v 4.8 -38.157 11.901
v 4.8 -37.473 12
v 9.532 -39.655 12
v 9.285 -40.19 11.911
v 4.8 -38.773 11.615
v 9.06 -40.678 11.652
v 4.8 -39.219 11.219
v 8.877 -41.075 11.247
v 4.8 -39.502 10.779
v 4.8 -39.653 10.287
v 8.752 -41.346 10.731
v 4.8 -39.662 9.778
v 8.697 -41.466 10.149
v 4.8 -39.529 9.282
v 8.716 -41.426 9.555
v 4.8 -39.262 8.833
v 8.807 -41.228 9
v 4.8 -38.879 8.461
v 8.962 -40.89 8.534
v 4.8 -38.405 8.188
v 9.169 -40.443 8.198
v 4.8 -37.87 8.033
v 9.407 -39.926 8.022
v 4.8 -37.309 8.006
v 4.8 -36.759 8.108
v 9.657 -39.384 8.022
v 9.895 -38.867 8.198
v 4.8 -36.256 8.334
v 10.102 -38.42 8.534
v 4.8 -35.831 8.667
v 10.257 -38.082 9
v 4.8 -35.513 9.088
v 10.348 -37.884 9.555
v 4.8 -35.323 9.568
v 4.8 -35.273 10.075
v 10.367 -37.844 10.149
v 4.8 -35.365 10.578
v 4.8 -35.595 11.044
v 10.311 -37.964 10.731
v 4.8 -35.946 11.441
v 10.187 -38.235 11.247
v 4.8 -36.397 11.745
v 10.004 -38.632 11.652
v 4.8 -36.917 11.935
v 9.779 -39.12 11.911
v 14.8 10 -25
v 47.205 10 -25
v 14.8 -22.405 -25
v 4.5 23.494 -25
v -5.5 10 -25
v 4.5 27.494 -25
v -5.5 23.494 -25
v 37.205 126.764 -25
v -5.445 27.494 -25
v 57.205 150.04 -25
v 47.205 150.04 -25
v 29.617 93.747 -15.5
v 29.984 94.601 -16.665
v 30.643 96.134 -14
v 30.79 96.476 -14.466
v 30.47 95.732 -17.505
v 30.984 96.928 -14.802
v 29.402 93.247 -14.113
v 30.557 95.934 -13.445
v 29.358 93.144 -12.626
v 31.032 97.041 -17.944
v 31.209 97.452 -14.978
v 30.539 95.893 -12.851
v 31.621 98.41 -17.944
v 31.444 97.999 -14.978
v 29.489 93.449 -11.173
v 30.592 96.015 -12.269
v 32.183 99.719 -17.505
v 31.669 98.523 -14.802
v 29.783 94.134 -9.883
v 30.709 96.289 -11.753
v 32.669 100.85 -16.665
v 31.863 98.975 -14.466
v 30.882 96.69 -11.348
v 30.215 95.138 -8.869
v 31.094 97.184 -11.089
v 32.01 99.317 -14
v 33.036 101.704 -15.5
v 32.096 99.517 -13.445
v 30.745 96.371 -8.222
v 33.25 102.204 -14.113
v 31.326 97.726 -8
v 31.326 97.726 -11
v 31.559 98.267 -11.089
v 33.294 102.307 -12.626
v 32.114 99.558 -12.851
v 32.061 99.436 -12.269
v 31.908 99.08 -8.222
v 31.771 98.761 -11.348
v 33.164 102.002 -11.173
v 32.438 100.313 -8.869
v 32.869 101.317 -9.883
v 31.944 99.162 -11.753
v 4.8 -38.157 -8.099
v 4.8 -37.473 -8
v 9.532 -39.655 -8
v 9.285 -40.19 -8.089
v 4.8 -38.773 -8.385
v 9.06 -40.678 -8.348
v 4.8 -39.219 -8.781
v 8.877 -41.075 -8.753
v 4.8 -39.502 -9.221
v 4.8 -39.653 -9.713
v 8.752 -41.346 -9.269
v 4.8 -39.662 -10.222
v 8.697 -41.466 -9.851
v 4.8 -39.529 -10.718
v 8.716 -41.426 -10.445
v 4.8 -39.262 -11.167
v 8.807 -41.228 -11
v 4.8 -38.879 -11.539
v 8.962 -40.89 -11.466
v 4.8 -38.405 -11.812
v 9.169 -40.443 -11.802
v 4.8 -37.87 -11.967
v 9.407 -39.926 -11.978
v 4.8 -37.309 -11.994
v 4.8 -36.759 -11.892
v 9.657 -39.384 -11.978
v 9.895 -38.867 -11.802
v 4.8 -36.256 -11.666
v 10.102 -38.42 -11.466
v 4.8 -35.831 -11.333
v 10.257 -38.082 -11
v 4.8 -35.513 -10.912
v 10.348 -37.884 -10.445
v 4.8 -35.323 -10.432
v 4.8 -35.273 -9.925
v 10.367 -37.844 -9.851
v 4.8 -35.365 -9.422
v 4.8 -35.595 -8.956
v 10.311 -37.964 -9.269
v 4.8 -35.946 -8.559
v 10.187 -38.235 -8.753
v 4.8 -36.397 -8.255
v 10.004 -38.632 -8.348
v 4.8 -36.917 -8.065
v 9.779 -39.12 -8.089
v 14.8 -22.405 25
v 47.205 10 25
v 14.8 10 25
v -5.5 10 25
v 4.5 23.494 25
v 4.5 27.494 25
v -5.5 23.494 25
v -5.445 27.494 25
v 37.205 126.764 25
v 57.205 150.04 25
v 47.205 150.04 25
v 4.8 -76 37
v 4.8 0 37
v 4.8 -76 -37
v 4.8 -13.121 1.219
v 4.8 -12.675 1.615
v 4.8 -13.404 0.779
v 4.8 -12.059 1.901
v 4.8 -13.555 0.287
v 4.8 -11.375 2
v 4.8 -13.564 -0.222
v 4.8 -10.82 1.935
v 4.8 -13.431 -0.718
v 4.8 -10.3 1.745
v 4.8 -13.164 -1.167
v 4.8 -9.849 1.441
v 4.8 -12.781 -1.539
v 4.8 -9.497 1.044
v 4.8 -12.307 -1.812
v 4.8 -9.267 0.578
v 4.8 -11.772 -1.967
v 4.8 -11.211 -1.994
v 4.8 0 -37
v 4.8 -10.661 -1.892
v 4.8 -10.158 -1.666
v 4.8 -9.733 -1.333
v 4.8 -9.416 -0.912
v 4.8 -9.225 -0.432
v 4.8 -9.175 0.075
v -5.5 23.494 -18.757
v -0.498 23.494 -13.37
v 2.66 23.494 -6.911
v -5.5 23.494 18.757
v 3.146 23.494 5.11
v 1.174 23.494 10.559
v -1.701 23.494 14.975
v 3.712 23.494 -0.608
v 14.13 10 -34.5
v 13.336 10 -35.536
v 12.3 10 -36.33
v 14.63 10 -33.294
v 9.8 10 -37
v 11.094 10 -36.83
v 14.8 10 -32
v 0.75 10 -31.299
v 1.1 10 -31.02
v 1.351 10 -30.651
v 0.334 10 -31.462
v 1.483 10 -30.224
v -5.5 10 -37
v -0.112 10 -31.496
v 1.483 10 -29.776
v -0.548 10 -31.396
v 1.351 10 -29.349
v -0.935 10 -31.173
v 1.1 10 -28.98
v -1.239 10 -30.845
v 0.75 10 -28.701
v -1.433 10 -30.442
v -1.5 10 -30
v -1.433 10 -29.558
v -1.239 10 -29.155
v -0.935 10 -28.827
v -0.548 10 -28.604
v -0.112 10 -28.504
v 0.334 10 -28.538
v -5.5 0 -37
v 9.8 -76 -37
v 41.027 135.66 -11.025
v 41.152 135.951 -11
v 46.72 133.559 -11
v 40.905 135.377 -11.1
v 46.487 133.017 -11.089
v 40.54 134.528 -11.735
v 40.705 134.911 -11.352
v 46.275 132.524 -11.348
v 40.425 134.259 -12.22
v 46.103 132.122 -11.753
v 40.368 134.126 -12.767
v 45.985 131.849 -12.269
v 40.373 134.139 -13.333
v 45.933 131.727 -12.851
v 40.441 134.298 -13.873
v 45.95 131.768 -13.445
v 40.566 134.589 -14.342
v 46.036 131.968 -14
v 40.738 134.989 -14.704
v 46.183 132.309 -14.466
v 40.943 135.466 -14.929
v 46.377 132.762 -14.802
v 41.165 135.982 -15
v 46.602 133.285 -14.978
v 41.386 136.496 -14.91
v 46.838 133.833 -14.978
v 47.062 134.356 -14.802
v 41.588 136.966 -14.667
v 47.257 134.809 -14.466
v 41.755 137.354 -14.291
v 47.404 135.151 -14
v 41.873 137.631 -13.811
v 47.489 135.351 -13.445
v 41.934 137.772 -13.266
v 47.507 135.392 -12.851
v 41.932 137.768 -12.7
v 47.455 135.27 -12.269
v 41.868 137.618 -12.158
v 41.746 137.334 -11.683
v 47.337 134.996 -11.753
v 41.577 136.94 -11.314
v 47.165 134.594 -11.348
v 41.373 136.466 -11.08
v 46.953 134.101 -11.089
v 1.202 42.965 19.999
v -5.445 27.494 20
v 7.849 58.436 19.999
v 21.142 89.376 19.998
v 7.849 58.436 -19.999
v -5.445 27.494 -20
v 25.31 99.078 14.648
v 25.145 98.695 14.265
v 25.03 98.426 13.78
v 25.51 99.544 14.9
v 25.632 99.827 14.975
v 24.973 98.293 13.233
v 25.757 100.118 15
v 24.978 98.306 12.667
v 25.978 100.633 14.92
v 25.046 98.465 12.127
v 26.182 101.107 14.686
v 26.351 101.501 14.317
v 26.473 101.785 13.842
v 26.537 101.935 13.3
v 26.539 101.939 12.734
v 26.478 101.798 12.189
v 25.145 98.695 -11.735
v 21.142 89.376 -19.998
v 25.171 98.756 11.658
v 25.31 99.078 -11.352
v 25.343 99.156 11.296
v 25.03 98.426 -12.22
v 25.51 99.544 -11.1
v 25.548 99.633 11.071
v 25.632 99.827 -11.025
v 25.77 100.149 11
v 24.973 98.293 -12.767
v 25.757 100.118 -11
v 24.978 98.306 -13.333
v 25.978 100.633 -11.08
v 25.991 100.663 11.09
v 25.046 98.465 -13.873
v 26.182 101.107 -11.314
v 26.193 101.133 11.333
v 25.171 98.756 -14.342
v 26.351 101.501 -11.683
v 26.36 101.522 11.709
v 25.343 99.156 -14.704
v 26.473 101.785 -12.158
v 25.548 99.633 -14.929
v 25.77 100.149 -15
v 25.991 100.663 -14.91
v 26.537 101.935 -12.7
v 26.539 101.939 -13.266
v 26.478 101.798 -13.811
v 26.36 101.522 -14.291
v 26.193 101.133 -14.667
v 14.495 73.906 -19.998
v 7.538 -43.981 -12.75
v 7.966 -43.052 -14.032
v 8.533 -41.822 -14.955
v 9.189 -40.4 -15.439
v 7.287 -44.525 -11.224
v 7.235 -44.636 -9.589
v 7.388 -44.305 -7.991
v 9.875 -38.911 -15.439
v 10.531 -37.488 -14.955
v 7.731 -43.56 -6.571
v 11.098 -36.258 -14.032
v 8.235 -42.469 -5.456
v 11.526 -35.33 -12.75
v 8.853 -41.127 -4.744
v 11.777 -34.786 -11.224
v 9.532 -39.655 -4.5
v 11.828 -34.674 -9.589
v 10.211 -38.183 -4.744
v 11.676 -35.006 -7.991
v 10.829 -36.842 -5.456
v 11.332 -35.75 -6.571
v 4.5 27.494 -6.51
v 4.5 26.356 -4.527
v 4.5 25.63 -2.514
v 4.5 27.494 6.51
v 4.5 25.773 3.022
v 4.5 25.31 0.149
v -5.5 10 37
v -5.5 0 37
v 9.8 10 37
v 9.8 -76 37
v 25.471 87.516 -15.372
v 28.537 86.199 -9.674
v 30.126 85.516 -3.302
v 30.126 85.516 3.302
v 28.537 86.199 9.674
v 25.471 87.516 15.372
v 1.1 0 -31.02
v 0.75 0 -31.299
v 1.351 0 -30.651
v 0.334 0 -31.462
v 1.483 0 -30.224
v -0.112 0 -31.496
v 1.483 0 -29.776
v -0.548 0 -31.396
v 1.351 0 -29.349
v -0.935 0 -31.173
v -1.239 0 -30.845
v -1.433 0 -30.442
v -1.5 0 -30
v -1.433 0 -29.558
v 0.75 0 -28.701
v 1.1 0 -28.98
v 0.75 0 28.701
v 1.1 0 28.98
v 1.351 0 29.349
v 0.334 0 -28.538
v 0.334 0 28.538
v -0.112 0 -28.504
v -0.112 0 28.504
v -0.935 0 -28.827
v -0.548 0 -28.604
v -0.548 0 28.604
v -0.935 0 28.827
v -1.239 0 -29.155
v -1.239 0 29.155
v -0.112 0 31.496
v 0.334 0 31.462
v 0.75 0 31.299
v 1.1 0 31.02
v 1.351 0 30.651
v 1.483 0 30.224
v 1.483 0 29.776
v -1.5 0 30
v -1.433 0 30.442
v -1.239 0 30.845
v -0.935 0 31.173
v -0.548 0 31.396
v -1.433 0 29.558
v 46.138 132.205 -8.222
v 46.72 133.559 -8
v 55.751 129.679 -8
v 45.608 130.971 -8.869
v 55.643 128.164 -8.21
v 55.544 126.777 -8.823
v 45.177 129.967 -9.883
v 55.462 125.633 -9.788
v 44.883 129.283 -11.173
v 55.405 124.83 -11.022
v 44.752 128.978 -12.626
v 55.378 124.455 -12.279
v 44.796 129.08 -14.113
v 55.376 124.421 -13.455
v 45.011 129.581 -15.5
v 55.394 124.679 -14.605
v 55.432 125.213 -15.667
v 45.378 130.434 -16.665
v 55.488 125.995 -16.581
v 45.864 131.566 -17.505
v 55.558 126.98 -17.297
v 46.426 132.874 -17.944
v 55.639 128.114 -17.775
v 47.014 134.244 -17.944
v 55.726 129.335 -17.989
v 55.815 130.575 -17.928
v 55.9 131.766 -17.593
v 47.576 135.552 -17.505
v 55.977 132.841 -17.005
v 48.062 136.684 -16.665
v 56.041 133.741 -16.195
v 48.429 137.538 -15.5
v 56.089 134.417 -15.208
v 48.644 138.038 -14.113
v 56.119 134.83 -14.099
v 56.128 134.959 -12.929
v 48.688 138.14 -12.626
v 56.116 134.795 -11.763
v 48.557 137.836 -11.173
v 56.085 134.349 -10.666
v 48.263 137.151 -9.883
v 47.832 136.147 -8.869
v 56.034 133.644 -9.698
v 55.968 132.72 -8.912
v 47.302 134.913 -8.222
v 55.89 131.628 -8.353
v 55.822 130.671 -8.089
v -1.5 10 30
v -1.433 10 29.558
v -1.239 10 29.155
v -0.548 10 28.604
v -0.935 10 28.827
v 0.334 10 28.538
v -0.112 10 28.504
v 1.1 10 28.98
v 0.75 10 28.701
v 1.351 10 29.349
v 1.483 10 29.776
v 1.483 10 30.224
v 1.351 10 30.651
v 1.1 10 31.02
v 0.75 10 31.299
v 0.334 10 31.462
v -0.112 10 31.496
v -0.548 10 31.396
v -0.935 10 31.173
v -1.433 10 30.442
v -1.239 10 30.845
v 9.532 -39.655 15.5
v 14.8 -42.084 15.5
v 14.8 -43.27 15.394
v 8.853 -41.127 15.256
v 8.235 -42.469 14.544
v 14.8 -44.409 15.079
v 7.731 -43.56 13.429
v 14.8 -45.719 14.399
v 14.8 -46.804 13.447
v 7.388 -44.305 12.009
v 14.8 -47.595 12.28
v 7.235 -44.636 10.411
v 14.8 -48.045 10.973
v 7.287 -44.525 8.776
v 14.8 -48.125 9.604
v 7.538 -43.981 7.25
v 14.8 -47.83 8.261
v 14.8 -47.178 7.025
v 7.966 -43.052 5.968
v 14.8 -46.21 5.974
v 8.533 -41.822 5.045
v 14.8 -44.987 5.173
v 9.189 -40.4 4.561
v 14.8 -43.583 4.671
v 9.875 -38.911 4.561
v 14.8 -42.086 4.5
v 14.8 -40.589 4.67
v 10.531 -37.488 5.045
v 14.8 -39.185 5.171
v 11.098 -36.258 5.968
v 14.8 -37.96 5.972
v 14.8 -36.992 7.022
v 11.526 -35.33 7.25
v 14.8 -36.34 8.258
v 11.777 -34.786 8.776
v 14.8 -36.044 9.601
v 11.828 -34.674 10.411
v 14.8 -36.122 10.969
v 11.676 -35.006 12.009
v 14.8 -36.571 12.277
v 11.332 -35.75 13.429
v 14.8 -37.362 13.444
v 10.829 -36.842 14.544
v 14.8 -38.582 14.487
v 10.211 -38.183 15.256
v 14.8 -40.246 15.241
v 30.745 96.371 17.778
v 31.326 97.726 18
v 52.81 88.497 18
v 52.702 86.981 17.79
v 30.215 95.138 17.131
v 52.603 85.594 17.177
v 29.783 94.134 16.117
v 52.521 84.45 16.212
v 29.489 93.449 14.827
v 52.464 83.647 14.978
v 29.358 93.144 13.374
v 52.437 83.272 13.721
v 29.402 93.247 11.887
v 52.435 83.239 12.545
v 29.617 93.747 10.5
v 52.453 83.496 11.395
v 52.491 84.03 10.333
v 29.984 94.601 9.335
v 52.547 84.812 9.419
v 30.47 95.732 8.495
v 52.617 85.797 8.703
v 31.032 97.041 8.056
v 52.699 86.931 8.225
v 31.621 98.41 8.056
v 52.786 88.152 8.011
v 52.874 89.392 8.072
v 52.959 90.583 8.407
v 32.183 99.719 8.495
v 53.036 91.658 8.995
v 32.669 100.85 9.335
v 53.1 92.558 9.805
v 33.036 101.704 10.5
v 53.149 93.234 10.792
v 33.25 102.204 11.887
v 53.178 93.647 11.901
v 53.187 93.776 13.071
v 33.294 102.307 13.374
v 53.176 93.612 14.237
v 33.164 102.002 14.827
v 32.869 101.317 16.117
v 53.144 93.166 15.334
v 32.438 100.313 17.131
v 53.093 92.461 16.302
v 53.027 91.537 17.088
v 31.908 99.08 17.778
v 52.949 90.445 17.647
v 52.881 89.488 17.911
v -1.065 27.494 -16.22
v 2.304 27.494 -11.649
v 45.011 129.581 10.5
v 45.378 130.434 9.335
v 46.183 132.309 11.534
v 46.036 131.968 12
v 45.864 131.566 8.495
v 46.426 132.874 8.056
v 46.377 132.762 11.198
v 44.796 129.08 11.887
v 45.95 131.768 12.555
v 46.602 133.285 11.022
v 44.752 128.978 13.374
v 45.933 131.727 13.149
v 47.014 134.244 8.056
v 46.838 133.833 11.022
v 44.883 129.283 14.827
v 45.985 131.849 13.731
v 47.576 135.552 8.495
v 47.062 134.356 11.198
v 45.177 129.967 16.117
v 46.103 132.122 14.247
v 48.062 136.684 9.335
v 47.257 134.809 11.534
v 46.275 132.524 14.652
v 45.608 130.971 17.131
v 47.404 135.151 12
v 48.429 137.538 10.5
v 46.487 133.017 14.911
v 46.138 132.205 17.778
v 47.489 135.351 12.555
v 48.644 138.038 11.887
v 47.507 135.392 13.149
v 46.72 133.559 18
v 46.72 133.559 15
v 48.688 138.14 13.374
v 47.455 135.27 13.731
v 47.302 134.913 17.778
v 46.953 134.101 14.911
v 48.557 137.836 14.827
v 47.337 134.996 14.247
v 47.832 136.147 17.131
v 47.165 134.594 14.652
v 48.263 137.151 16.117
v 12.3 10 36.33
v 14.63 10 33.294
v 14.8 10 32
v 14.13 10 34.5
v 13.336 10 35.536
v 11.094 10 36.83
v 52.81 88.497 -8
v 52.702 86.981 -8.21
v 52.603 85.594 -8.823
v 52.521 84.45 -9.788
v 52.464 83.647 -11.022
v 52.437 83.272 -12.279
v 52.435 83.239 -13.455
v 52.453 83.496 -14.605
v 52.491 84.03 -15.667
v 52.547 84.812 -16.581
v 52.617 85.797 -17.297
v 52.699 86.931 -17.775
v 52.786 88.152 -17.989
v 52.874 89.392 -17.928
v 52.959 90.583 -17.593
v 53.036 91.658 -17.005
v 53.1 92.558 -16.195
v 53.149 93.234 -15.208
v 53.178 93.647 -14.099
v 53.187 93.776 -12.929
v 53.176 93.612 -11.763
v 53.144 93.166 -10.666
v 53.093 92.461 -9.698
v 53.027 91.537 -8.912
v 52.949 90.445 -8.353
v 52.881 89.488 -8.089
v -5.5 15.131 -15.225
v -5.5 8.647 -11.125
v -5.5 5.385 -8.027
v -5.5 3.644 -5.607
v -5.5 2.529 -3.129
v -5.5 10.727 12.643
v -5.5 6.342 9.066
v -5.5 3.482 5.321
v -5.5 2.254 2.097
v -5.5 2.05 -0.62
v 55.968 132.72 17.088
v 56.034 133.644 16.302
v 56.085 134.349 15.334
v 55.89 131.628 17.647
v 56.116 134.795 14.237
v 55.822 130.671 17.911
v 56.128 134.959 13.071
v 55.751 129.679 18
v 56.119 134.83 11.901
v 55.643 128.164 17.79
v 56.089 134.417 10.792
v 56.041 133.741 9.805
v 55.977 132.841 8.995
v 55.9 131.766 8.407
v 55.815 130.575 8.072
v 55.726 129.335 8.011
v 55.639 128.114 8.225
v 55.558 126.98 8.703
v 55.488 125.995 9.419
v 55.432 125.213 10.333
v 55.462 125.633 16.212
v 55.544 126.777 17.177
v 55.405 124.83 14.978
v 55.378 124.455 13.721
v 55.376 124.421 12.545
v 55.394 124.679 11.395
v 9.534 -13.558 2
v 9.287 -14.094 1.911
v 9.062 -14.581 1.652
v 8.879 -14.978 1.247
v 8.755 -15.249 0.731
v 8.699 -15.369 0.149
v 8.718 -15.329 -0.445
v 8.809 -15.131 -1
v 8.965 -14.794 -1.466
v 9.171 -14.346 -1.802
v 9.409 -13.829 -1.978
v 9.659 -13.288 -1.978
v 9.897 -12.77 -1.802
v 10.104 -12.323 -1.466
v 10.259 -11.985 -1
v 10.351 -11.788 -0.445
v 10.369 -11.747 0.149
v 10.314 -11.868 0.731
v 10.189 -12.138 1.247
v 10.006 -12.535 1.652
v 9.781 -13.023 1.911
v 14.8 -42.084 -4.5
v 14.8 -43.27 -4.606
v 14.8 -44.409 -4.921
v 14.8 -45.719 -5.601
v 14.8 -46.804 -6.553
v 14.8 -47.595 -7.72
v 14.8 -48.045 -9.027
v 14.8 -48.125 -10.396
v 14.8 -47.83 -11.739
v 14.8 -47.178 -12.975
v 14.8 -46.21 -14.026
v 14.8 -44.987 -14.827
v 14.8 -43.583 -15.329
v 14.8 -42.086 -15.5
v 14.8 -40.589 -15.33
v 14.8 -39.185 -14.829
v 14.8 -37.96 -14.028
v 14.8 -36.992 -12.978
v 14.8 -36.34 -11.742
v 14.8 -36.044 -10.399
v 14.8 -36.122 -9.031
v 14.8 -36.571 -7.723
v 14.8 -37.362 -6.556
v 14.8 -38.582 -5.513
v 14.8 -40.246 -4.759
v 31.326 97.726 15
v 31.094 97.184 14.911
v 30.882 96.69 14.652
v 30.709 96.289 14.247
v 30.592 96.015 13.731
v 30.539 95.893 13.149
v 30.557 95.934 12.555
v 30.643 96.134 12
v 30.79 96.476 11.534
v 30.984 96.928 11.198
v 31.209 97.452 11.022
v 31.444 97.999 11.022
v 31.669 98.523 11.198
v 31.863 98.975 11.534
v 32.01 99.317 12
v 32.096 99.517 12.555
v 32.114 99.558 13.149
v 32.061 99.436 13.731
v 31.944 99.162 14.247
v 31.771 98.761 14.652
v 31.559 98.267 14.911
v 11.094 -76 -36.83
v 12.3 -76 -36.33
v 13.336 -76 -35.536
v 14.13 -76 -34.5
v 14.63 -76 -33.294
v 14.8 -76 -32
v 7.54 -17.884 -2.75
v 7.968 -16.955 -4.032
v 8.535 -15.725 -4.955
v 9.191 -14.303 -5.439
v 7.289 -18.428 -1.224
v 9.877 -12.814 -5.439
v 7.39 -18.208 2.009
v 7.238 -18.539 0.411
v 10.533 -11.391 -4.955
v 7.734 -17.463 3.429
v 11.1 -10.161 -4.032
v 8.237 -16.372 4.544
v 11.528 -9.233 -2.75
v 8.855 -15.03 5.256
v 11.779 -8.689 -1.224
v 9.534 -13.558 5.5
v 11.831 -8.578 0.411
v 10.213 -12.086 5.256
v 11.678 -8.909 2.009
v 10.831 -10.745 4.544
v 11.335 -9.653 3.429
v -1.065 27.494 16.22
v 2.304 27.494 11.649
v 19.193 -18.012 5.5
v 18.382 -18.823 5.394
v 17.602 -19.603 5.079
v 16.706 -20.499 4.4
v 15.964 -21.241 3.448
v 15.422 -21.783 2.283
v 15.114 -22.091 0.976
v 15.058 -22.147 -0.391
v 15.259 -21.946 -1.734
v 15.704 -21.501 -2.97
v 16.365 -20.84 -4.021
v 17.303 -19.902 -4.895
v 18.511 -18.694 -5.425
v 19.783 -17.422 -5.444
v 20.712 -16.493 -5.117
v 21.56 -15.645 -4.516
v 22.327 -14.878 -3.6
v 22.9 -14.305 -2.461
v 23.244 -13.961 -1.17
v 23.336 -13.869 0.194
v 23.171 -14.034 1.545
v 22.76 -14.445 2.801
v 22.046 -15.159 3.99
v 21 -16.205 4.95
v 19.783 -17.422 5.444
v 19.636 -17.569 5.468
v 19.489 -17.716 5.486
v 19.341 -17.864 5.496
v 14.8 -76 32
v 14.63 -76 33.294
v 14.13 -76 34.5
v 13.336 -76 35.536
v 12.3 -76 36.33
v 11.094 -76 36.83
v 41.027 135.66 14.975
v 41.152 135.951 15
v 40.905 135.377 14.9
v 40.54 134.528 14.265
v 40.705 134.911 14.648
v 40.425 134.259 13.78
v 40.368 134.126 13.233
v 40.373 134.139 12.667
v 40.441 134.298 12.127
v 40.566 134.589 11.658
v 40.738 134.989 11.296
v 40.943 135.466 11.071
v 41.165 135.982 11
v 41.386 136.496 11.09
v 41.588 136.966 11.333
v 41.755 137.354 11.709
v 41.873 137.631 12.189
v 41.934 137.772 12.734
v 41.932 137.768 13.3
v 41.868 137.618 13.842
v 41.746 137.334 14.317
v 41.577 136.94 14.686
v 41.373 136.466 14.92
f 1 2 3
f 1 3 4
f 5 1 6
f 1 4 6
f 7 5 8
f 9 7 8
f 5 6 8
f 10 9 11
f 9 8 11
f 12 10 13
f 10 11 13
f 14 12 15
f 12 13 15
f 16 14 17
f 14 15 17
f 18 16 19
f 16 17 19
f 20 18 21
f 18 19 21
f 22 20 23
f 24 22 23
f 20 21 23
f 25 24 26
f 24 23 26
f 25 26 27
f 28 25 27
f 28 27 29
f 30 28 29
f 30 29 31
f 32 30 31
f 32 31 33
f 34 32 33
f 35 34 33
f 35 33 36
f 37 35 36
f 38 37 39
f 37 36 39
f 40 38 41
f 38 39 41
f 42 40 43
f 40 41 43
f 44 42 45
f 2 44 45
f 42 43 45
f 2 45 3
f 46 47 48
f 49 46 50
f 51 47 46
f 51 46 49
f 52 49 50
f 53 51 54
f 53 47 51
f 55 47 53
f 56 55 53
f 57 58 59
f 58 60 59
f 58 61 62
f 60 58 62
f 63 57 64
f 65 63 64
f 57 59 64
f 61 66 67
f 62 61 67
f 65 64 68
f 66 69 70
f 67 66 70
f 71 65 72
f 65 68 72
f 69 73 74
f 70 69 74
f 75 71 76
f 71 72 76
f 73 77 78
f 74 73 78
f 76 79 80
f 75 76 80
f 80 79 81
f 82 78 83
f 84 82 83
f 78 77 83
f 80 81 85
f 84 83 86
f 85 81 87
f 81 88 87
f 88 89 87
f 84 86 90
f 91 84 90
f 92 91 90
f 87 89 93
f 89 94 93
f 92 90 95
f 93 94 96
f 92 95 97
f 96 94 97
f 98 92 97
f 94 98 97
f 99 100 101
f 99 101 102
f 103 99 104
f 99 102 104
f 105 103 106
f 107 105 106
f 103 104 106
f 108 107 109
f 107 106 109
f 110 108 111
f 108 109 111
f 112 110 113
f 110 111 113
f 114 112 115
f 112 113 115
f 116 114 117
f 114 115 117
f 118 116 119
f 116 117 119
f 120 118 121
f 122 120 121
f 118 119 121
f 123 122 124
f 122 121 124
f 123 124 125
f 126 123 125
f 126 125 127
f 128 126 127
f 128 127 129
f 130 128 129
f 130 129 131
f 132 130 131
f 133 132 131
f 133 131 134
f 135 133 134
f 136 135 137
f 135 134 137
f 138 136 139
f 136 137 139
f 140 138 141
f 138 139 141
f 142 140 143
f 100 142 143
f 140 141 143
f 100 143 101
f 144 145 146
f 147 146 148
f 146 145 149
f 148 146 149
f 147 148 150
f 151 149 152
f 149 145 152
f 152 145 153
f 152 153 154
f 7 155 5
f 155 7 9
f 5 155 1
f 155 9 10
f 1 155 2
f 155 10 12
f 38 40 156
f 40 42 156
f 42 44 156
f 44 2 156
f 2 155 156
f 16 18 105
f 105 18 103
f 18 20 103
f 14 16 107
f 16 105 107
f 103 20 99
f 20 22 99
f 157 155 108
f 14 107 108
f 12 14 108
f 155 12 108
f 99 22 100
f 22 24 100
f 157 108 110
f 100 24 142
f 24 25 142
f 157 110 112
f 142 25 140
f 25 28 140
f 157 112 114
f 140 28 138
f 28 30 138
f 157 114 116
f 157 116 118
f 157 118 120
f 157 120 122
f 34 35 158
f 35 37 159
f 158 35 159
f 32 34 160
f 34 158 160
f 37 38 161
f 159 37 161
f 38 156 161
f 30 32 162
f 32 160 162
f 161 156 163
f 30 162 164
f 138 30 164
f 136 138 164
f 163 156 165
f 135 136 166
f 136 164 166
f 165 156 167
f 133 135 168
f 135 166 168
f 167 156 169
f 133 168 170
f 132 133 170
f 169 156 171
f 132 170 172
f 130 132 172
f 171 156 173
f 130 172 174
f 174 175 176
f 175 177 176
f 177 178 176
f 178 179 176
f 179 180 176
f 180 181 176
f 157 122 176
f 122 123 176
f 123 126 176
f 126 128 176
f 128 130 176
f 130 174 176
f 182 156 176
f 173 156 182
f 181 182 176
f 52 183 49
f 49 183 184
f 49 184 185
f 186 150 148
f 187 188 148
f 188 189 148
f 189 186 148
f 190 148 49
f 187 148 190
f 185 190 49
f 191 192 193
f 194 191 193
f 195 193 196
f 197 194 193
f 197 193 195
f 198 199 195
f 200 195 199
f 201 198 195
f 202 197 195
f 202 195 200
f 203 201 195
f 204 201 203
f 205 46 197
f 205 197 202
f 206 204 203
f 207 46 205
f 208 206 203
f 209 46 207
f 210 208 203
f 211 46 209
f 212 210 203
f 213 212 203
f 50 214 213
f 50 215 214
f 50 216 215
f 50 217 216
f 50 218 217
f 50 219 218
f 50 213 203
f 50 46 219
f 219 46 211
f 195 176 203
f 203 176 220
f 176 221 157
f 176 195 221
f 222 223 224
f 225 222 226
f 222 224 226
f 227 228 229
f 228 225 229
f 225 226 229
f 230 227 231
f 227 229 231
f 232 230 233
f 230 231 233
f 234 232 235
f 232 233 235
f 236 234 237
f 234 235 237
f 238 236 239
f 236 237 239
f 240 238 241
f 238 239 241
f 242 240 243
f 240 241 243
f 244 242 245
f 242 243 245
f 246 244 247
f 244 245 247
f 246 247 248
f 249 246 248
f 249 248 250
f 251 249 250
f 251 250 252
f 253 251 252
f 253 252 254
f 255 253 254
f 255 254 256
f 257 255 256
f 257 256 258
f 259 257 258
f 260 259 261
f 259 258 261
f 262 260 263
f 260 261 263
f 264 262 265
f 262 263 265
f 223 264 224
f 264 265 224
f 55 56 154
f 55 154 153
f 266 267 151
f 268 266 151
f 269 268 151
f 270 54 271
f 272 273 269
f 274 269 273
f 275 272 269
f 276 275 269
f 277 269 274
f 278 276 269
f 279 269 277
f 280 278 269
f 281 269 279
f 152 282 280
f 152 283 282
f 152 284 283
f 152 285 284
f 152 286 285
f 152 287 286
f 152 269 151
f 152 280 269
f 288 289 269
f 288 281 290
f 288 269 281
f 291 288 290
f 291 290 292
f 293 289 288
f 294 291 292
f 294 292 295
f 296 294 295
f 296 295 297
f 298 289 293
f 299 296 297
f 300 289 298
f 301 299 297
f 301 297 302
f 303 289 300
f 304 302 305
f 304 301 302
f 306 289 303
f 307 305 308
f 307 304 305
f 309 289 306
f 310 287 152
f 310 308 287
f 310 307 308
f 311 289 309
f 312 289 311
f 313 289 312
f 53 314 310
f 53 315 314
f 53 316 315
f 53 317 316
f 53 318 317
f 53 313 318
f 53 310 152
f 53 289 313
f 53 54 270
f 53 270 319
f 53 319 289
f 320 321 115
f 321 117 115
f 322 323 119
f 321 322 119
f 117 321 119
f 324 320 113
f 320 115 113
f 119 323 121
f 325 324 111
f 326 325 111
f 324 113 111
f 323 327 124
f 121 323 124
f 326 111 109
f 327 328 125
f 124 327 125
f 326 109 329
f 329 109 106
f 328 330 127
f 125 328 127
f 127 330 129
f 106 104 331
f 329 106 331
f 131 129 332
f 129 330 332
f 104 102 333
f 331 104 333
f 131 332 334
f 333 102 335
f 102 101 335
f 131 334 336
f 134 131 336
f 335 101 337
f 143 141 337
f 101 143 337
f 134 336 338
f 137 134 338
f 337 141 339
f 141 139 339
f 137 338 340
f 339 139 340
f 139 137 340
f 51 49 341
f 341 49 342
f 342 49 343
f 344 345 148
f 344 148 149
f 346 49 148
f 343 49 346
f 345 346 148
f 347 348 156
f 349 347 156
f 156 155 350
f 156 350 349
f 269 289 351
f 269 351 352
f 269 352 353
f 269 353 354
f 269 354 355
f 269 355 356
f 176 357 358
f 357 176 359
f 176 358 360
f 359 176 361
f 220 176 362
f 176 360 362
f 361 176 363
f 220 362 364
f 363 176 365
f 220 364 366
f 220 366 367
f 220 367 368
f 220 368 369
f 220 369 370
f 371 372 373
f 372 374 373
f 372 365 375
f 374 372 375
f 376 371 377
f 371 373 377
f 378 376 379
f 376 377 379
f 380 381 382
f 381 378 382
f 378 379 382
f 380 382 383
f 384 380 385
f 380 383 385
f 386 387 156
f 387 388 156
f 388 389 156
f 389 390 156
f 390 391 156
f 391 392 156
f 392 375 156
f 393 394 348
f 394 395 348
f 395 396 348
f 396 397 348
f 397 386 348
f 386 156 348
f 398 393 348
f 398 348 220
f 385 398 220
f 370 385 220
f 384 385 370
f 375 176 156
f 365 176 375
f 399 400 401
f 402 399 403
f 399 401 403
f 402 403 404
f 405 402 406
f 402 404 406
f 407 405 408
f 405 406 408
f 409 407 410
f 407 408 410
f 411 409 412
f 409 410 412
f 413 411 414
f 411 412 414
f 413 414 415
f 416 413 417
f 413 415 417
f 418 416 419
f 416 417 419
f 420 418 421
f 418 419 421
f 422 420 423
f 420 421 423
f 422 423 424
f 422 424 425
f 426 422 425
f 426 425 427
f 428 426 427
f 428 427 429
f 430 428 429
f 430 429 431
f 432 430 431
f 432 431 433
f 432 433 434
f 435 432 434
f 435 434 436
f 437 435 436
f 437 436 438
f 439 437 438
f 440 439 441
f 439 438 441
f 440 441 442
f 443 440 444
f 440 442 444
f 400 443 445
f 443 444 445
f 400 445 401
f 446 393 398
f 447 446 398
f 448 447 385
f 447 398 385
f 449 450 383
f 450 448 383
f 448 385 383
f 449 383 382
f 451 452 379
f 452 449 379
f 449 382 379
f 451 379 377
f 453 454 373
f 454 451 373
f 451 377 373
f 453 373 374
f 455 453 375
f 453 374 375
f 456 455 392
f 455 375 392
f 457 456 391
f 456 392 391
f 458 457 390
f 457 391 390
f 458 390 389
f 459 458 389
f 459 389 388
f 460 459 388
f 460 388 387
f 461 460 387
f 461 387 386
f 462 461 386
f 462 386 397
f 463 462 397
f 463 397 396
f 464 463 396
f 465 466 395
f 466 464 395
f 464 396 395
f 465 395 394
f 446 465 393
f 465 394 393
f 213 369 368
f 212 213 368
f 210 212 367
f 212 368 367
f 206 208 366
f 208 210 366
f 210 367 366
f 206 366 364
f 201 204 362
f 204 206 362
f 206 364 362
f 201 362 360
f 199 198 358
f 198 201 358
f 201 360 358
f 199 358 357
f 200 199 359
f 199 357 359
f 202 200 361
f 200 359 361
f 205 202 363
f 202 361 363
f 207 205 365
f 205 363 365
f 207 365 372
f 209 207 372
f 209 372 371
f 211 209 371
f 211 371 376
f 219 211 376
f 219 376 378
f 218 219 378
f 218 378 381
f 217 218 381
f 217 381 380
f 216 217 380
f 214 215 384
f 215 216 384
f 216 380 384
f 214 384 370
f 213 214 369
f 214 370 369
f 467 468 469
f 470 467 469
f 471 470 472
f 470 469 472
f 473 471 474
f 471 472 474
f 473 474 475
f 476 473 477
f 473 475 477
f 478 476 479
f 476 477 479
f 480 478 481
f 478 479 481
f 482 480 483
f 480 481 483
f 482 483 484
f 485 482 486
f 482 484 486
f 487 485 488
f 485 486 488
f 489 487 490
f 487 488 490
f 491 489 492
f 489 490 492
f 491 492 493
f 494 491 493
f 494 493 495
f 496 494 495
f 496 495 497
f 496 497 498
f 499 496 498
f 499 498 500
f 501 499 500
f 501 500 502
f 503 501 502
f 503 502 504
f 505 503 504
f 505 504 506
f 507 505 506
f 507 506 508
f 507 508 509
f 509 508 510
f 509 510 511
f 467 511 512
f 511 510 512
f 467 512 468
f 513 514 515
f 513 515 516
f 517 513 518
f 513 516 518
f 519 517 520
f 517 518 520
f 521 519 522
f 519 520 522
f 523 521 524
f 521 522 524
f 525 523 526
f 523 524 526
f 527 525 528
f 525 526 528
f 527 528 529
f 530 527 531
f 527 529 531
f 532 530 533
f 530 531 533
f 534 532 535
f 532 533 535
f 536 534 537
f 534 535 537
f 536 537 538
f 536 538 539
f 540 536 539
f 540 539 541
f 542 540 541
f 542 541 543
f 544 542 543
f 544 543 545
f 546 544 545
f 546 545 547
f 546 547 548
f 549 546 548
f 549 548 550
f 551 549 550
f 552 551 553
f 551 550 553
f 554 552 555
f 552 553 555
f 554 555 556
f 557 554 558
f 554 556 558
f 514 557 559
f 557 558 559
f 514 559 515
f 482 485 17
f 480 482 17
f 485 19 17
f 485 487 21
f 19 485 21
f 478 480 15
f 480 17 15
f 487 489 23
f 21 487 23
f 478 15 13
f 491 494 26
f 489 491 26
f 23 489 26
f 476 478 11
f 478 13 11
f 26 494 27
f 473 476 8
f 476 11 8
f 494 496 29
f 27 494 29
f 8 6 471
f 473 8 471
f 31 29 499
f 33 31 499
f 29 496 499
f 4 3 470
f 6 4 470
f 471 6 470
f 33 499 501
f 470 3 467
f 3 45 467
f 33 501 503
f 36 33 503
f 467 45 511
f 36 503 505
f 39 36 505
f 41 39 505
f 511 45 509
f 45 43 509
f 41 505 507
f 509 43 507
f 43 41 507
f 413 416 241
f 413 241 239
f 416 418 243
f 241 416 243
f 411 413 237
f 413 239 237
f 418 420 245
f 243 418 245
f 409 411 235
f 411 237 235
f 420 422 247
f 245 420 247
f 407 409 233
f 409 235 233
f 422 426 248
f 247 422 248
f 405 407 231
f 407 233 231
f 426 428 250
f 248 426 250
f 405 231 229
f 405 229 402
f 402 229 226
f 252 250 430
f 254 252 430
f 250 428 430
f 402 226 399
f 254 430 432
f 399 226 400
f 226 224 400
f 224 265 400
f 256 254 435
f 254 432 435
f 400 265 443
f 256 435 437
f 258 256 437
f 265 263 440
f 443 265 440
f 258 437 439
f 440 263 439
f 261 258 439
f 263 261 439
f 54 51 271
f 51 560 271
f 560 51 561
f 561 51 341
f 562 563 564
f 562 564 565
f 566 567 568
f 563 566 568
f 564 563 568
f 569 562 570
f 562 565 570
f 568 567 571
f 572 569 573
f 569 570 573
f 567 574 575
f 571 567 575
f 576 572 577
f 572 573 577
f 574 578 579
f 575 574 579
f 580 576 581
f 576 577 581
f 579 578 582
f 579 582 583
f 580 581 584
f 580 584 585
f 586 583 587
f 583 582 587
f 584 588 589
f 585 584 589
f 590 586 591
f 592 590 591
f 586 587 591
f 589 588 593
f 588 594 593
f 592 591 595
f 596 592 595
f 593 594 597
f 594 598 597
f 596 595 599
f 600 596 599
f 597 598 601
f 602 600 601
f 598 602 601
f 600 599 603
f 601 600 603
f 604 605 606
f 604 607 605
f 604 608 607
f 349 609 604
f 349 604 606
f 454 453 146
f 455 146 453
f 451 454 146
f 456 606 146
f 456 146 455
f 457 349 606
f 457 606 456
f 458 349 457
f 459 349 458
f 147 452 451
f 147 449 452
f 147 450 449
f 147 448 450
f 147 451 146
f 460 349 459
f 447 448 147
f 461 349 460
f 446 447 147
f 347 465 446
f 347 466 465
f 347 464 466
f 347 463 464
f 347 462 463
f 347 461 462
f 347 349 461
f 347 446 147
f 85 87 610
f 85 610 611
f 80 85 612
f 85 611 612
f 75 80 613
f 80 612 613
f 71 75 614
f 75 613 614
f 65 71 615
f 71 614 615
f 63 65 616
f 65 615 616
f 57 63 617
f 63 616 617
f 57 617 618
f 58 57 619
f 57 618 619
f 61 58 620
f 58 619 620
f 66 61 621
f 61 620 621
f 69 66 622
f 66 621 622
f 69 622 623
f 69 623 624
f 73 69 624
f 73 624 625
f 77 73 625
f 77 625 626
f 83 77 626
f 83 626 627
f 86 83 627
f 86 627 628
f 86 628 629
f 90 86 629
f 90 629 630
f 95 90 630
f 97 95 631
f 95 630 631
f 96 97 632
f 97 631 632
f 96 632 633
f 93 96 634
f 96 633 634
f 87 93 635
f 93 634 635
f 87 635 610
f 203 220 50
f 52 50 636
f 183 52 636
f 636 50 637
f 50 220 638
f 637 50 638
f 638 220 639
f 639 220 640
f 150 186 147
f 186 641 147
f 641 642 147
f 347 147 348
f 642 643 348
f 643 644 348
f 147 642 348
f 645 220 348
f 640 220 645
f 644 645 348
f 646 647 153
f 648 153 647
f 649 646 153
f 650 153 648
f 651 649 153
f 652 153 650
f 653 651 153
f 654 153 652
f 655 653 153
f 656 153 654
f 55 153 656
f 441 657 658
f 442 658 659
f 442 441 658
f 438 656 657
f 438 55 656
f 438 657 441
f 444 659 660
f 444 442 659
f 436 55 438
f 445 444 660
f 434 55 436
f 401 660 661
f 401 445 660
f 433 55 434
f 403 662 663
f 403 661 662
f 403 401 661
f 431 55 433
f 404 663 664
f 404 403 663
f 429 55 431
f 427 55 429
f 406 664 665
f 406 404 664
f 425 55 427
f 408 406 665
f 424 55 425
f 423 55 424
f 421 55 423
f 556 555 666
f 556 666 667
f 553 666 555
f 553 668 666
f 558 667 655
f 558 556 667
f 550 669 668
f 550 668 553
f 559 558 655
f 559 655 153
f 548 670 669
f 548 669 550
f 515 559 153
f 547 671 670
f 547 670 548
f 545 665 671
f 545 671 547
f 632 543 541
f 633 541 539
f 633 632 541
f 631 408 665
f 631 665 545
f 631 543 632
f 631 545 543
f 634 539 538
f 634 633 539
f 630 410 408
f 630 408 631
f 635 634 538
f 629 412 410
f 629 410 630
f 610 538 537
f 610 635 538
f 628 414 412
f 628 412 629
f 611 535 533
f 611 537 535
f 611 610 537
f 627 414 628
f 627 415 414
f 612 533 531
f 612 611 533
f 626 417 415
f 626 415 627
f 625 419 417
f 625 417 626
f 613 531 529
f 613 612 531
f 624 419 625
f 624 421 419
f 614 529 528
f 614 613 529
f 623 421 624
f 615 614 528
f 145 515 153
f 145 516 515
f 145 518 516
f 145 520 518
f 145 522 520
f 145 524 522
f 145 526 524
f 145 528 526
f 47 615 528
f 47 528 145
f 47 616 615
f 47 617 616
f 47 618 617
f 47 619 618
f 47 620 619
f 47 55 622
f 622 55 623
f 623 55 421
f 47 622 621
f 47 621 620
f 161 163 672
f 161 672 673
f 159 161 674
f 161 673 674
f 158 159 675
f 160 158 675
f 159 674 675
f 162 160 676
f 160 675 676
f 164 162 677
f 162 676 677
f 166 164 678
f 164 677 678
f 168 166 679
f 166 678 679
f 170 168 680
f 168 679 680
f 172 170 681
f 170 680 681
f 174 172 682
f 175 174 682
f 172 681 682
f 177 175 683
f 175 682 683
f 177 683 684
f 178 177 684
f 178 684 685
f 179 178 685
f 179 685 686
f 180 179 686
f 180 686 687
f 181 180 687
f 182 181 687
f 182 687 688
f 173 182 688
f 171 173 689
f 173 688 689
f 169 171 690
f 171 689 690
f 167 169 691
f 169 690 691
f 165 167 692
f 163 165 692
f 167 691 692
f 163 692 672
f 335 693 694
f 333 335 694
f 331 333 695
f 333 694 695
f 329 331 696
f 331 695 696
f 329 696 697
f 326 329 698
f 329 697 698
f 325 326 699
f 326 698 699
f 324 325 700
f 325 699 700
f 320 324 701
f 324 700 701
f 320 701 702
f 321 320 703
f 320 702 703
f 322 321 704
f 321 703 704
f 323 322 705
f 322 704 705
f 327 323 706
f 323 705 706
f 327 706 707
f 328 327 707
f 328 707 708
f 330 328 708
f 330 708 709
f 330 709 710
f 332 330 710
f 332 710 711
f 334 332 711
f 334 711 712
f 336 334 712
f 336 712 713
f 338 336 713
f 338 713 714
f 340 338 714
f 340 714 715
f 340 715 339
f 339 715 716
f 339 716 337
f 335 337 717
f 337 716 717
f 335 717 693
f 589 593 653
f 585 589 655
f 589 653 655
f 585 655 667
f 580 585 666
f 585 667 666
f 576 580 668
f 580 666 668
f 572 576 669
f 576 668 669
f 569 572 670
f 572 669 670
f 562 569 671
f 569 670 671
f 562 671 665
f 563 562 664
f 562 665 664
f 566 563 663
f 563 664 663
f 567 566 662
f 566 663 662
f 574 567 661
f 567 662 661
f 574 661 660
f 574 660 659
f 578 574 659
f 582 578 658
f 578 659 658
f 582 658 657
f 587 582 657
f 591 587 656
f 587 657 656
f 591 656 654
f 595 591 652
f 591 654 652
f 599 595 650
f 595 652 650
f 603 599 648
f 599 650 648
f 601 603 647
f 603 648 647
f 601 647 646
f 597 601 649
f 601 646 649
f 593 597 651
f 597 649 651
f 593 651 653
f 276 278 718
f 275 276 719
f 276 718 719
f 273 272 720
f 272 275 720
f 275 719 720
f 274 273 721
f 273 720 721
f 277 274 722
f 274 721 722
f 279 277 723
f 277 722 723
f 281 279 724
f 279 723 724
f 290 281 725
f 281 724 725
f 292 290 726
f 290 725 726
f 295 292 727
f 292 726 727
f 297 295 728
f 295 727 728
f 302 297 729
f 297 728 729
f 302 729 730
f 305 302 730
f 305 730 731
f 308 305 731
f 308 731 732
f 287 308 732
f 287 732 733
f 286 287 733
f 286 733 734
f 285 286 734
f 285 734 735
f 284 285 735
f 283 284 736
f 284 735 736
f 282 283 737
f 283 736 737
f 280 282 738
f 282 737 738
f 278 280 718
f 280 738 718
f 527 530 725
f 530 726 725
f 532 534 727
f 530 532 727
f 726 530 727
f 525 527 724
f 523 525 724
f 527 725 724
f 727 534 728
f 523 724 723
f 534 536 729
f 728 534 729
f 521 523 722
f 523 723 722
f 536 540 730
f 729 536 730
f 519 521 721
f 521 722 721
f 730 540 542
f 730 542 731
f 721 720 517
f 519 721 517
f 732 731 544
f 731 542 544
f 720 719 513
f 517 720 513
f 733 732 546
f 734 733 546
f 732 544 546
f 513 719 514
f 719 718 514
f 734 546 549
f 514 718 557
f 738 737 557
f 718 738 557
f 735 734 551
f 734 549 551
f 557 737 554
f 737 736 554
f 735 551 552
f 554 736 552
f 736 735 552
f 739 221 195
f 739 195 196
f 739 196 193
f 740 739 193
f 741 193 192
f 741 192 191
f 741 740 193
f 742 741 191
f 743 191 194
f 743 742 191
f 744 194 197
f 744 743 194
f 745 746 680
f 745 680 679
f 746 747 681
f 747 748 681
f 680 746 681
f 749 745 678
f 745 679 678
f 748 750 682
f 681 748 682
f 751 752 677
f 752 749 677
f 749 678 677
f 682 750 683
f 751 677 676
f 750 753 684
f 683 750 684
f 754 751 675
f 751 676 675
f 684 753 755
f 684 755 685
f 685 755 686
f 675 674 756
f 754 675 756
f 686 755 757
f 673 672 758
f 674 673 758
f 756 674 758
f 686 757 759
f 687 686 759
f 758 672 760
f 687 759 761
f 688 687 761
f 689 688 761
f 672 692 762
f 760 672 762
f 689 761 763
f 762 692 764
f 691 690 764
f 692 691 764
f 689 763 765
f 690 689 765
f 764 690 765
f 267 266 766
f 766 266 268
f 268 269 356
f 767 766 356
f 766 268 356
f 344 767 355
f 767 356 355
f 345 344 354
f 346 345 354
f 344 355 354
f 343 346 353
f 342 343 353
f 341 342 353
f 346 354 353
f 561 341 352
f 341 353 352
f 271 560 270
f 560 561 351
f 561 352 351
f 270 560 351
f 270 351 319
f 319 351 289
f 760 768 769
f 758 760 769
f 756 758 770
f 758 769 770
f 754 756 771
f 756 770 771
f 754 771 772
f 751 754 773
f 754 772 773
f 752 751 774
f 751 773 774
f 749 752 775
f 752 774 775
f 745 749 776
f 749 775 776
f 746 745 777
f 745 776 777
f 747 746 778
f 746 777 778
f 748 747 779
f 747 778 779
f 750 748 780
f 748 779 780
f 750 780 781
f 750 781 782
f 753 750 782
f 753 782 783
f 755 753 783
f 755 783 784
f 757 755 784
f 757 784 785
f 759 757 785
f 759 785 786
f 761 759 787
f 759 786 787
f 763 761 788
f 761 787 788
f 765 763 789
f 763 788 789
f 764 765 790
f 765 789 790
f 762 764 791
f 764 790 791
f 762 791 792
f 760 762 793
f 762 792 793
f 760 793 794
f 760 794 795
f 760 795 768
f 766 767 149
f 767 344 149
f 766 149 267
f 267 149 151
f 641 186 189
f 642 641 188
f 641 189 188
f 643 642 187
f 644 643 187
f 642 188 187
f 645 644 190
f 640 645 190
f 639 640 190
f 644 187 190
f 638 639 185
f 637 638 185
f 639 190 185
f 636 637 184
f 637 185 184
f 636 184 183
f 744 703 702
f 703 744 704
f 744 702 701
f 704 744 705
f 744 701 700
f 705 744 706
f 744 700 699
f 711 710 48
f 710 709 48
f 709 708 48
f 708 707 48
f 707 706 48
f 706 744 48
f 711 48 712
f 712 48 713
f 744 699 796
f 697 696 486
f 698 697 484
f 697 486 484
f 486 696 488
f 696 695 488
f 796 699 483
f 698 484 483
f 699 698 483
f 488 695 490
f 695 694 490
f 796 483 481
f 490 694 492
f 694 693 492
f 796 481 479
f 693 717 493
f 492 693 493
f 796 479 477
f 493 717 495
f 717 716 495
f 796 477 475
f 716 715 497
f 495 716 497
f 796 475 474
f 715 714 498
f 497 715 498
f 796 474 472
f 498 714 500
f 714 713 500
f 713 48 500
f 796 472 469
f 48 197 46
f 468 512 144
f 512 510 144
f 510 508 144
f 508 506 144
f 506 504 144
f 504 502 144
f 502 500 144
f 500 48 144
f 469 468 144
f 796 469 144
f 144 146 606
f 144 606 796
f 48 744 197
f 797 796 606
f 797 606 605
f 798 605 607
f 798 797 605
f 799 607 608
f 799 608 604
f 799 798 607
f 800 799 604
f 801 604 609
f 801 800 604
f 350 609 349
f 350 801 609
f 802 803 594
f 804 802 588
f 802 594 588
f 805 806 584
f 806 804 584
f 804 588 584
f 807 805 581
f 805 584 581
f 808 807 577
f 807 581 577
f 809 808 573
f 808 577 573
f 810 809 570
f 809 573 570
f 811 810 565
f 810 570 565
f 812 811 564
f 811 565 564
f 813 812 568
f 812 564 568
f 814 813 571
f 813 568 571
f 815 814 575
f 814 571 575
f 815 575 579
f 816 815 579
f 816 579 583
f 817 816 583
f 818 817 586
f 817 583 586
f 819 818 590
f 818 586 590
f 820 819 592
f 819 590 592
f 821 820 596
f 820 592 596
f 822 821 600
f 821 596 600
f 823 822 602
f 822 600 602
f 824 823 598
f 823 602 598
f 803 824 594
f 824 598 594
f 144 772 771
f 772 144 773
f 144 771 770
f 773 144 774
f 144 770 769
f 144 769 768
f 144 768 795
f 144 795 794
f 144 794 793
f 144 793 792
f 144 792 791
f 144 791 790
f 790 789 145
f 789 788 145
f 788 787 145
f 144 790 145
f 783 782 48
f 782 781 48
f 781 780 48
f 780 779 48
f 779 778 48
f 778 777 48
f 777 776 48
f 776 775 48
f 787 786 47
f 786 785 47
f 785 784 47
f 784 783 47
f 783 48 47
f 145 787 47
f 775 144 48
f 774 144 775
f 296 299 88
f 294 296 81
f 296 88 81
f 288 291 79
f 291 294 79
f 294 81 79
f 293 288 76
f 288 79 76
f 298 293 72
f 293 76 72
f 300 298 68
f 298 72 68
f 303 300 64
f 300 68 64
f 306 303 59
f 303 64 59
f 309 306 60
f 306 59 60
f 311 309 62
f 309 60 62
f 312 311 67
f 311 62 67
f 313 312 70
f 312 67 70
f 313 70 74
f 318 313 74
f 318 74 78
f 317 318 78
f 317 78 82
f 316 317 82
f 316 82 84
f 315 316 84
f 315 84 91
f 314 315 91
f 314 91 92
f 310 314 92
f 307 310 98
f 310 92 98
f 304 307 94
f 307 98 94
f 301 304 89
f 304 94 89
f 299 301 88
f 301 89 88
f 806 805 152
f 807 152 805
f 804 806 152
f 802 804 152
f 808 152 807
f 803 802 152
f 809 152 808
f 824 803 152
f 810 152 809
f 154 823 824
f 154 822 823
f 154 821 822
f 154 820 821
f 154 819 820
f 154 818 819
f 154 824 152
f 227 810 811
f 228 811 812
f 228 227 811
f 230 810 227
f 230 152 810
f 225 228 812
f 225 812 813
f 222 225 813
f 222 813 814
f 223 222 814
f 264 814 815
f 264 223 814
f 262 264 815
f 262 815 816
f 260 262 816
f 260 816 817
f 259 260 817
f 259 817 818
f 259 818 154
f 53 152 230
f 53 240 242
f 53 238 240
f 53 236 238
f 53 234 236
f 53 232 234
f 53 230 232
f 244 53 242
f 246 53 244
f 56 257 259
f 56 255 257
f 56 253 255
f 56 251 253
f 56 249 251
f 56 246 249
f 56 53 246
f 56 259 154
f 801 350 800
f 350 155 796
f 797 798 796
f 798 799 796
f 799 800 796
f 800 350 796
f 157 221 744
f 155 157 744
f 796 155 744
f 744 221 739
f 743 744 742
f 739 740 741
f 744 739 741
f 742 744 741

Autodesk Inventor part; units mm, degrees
sketch "Sketch1" plane through (0, 0, 0) normal (0, 1, 0) x (-1, 0, 0)
  line L0 (-5.5, -37) -> (5.5, -37)
  line L1 (5.5, -37) -> (5.5, 37)
  line L2 (5.5, 37) -> (-5.5, 37)
  line L3 (-5.5, 37) -> (-5.5, -37)
  line L4 (-5.5, -37) -> (5.5, 37) construction
  line L5 (5.5, -37) -> (-5.5, 37) construction
  line L6 (-5.5, -25) -> (5.5, -25)
  line L7 (5.5, -25) -> (5.5, 25)
  line L8 (5.5, 25) -> (-5.5, 25)
  line L9 (-5.5, 25) -> (-5.5, -25)
  line L10 (-5.5, -25) -> (5.5, 25) construction
  line L11 (5.5, -25) -> (-5.5, 25) construction
  circle A0 centre (0, 30) radius 1.5
  circle A1 centre (0, -30) radius 1.5
  point P0 (0, 0)
  point P1 (0, -37)
  dimension "d0" = 74
  dimension "d1" = 11
  dimension "d2" = 11
  dimension "d3" = 50
  dimension "d4" = 3
  dimension "d5" = 7
  dimension "d6" = 3
  dimension "d7" = 7
extrude "Extrusion1" add sketch "Sketch1" along normal blind 10
sketch "Sketch2" plane through (0, 10, 0) normal (0, 1, 0) x (1, 0, 0)
  line L0 (5.5, 37) -> (-5.5, 37) projected
  line L1 (4.8, 37) -> (14.8, 37)
  line L2 (14.8, 37) -> (14.8, -37)
  line L3 (14.8, -37) -> (4.8, -37)
  line L4 (4.8, -37) -> (4.8, 37)
  line L5 (5.5, -37) -> (5.5, 37) projected
  point P0 (0, 0)
  dimension "d10" = 74
  dimension "d11" = 0.7
  dimension "d12" = 10
extrude "Extrusion2" add sketch "Sketch2" against normal blind 86
ref_plane "Work Plane1" through (-5.5, 0, 0) normal (0, 0, 1) x (1, 0, 0)
sketch "Sketch3" plane through (-5.5, 0, 0) normal (0, 0, 1) x (1, 0, 0)
  line L0 (20.3, 10) -> (0, 10) projected
  line L1 (0, 10) -> (0, 27.494)
  line L2 (0, 27.494) -> (0.055, 27.494)
  line L3 (20.3, 10) -> (20.3, -76) projected
  line L4 (20.3, 10) -> (20.3, -22.405)
  line L5 (20.3, 10) -> (52.705, 10) construction
  line L6 (20.3, -22.405) -> (52.705, 10)
  line L7 (20.3, -22.405) -> (66.1276, -22.405) construction
  line L8 (52.705, 10) -> (52.705, 310)
  line L9 (52.705, 10) -> (352.705, 10) construction
  line L10 (0.055, 27.494) -> (10.055, 27.494) construction
  line L11 (52.705, 101.8003) -> (42.705, 101.8003) construction
  line L12 (42.705, 101.8003) -> (42.705, 219.1463) construction
  line L13 (42.705, 101.8003) -> (160.051, 101.8003) construction
  line L14 (0.055, 27.494) -> (42.705, 126.7645)
  line L15 (42.705, 126.7645) -> (52.705, 126.7645)
  point P0 (5.5, 0)
  dimension "d15" = 17.494
  dimension "d18" = 32.405
  dimension "d19" = 90
  dimension "d20" = 45
  dimension "d22" = 90
  dimension "d23" = 10
  dimension "d25" = 10
  dimension "d27" = 90
  dimension "d79" = 66.75
extrude "Extrusion3" add sketch "Sketch3" along normal mid plane 50
ref_plane "Work Plane2" through (-5.5, 27.494, 0) normal (-0.3947, -0.9188, 0) x (0, 0, 1)
sketch "Sketch4" plane through (-5.5, 0, 25) normal (0, 0, 1) x (1, 0, 0)
  line L0 (0, 0) -> (0, 10) construction
  line L1 (0, 10) -> (0, 23.494) construction
  line L2 (0, 23.494) -> (10, 23.494)
  line L3 (10, 23.494) -> (10, 27.494)
  line L4 (10, 27.494) -> (0, 27.494)
  line L5 (0, 27.494) -> (0, 23.494)
  point P0 (5.5, 0)
  dimension "d31" = 13.494
  dimension "d32" = 10
  dimension "d33" = 4
extrude "Extrusion4" cut sketch "Sketch4" against normal blind 269.75
sketch "Sketch5" plane through (-5.5, 27.494, 0) normal (-0.3947, -0.9188, 0) x (0, 0, 1)
  circle A0 centre (0, 14.9495) radius 25
  line L0 (-25, -0.0505) -> (25, -0.0505) projected
  point P0 (0, -15.9064)
  dimension "d36" = 50
  dimension "d37" = 15
ref_plane "Work Plane3" through (37.205, 87.7645, 25) normal (0, 1, 0) x (1, 0, 0)
extrude "Extrusion5" cut sketch "Sketch5" along normal blind 54.3375 and the other way blind 67.371
ref_plane "Work Plane5" through (10.2593, -73.9067, 37) normal (-0.9081, 0.4187, 0) x (0, 0, 1)
ref_plane "Work Plane4" through (14.8, -76, 37) normal (-0.9081, 0.4187, 0) x (0, 0, 1)
sketch "Sketch6" plane through (10.2593, -73.9067, 37) normal (-0.9081, 0.4187, 0) x (0, 0, 1)
  line L0 (-74, 0) -> (0, 0) projected
  circle A0 centre (-37, 54.5) radius 5.5
  circle A1 centre (-37, 54.5) radius 2
  line L1 (-37, -200) -> (-37, 49)
  line L2 (-37, 60) -> (-37, 200)
  circle A2 centre (-47, 30.8) radius 5.5
  circle A3 centre (-47, 30.8) radius 2
  circle A4 centre (-27, 30.8) radius 5.5
  circle A5 centre (-27, 30.8) radius 2
  point P0 (-37, 62.8227)
  point P1 (-37, 0)
  dimension "d43" = 400
  dimension "d44" = 11
  dimension "d45" = 4
  dimension "d46" = 11
  dimension "d47" = 4
  dimension "d48" = 54.5
  dimension "d49" = 23.7
  dimension "d91" = 10
extrude "Extrusion6" cut sketch "Sketch6" along normal blind 15 contours A0 | A1 | A2 | A3 | A4 | A5
extrude "Extrusion7" cut sketch "Sketch6" along normal blind 25.925 contours A0 | A1
extrude "Extrusion8" cut sketch "Sketch6" along normal blind 34.505 contours A1 | A3 | A5
ref_plane "Work Plane6" through (69.3627, 112.9485, -25) normal (-0.9188, 0.3947, 0) x (0, 0, 1)
sketch "Sketch7" plane through (69.3627, 112.9485, -25) normal (-0.9188, 0.3947, 0) x (0, 0, 1)
  line L0 (0, 0) -> (50, 0) projected
  line L1 (25, 150) -> (25, -150)
  line L2 (25, 150) -> (325, 150) construction
  line L3 (38, 10) -> (12, 10) construction
  line L4 (12, 10) -> (12, -29) construction
  line L5 (12, -29) -> (38, -29) construction
  line L6 (38, -29) -> (38, 10) construction
  circle A0 centre (38, 10) radius 2
  circle A1 centre (38, 10) radius 5
  circle A2 centre (38, -29) radius 2
  circle A3 centre (38, -29) radius 5
  circle A4 centre (12, 10) radius 2
  circle A5 centre (12, 10) radius 5
  circle A6 centre (12, -29) radius 2
  circle A7 centre (12, -29) radius 5
  line L7 (0, 3.9474) -> (50, 3.9474) projected
  point P0 (25, -131.1566)
  point P1 (25, 0)
  dimension "d57" = 300
  dimension "d58" = 90
  dimension "d63" = 26
  dimension "d64" = 39
  dimension "d67" = 4
  dimension "d68" = 10
  dimension "d69" = 10
  dimension "d70" = 4
  dimension "d78" = 13
  dimension "d85" = 10
fillet "Fillet1" radius 5 2 edges at (14.8, -33, 37) (14.8, -33, -37)
sketch "Sketch8" plane through (-5.5, 0, -25) normal (0, 0, -1) x (-1, 0, 0)
  line L0 (-52.705, 126.7645) -> (-42.705, 126.7645) construction
  line L1 (-42.705, 126.7645) -> (-52.705, 126.7645) construction
  line L2 (-52.705, 10) -> (-52.705, 126.7645) projected
  line L3 (-0.055, 27.494) -> (-42.705, 126.7645) projected
  line L4 (-42.705, 126.7645) -> (-52.705, 150.0402)
  line L5 (-52.705, 126.7645) -> (-42.705, 126.7645)
  line L6 (-52.705, 150.0402) -> (-62.705, 150.0402)
  line L7 (-62.705, 150.0402) -> (-52.705, 10)
  point P0 (-5.5, 0)
  dimension "d80" = 66.75
  dimension "d88" = 10
extrude "Extrusion13" add sketch "Sketch8" against normal blind 50
extrude "Extrusion9" cut sketch "Sketch7" along normal blind 28.9375 contours A0 | A1 | A2 | A3 | A4 | A5 | A6 | A7
extrude "Extrusion10" cut sketch "Sketch7" along normal blind 43.9375 contours A0 | A2 | A4 | A6
ref_plane "Work Plane8" through (23.154, -45.9359, -10) normal (0, 0, -1) x (-1, 0, 0)
ref_plane "Work Plane7" through (23.154, -45.9359, -12) normal (0, 0, -1) x (-1, 0, 0)
equation "\"d6\" = d4"
equation "\"d7\" = d5"
equation "\"d46\" = d44"
equation "\"d47\" = d45"
equation "\"d69\" = d68"
equation "\"d70\" = d67"
equation "\"d78\" = 0.5 * d63"
equation "\"d85\" = screw_offset"
equation "\"screw_offset\" = 10"
properties part number "Camera_Bracket"
